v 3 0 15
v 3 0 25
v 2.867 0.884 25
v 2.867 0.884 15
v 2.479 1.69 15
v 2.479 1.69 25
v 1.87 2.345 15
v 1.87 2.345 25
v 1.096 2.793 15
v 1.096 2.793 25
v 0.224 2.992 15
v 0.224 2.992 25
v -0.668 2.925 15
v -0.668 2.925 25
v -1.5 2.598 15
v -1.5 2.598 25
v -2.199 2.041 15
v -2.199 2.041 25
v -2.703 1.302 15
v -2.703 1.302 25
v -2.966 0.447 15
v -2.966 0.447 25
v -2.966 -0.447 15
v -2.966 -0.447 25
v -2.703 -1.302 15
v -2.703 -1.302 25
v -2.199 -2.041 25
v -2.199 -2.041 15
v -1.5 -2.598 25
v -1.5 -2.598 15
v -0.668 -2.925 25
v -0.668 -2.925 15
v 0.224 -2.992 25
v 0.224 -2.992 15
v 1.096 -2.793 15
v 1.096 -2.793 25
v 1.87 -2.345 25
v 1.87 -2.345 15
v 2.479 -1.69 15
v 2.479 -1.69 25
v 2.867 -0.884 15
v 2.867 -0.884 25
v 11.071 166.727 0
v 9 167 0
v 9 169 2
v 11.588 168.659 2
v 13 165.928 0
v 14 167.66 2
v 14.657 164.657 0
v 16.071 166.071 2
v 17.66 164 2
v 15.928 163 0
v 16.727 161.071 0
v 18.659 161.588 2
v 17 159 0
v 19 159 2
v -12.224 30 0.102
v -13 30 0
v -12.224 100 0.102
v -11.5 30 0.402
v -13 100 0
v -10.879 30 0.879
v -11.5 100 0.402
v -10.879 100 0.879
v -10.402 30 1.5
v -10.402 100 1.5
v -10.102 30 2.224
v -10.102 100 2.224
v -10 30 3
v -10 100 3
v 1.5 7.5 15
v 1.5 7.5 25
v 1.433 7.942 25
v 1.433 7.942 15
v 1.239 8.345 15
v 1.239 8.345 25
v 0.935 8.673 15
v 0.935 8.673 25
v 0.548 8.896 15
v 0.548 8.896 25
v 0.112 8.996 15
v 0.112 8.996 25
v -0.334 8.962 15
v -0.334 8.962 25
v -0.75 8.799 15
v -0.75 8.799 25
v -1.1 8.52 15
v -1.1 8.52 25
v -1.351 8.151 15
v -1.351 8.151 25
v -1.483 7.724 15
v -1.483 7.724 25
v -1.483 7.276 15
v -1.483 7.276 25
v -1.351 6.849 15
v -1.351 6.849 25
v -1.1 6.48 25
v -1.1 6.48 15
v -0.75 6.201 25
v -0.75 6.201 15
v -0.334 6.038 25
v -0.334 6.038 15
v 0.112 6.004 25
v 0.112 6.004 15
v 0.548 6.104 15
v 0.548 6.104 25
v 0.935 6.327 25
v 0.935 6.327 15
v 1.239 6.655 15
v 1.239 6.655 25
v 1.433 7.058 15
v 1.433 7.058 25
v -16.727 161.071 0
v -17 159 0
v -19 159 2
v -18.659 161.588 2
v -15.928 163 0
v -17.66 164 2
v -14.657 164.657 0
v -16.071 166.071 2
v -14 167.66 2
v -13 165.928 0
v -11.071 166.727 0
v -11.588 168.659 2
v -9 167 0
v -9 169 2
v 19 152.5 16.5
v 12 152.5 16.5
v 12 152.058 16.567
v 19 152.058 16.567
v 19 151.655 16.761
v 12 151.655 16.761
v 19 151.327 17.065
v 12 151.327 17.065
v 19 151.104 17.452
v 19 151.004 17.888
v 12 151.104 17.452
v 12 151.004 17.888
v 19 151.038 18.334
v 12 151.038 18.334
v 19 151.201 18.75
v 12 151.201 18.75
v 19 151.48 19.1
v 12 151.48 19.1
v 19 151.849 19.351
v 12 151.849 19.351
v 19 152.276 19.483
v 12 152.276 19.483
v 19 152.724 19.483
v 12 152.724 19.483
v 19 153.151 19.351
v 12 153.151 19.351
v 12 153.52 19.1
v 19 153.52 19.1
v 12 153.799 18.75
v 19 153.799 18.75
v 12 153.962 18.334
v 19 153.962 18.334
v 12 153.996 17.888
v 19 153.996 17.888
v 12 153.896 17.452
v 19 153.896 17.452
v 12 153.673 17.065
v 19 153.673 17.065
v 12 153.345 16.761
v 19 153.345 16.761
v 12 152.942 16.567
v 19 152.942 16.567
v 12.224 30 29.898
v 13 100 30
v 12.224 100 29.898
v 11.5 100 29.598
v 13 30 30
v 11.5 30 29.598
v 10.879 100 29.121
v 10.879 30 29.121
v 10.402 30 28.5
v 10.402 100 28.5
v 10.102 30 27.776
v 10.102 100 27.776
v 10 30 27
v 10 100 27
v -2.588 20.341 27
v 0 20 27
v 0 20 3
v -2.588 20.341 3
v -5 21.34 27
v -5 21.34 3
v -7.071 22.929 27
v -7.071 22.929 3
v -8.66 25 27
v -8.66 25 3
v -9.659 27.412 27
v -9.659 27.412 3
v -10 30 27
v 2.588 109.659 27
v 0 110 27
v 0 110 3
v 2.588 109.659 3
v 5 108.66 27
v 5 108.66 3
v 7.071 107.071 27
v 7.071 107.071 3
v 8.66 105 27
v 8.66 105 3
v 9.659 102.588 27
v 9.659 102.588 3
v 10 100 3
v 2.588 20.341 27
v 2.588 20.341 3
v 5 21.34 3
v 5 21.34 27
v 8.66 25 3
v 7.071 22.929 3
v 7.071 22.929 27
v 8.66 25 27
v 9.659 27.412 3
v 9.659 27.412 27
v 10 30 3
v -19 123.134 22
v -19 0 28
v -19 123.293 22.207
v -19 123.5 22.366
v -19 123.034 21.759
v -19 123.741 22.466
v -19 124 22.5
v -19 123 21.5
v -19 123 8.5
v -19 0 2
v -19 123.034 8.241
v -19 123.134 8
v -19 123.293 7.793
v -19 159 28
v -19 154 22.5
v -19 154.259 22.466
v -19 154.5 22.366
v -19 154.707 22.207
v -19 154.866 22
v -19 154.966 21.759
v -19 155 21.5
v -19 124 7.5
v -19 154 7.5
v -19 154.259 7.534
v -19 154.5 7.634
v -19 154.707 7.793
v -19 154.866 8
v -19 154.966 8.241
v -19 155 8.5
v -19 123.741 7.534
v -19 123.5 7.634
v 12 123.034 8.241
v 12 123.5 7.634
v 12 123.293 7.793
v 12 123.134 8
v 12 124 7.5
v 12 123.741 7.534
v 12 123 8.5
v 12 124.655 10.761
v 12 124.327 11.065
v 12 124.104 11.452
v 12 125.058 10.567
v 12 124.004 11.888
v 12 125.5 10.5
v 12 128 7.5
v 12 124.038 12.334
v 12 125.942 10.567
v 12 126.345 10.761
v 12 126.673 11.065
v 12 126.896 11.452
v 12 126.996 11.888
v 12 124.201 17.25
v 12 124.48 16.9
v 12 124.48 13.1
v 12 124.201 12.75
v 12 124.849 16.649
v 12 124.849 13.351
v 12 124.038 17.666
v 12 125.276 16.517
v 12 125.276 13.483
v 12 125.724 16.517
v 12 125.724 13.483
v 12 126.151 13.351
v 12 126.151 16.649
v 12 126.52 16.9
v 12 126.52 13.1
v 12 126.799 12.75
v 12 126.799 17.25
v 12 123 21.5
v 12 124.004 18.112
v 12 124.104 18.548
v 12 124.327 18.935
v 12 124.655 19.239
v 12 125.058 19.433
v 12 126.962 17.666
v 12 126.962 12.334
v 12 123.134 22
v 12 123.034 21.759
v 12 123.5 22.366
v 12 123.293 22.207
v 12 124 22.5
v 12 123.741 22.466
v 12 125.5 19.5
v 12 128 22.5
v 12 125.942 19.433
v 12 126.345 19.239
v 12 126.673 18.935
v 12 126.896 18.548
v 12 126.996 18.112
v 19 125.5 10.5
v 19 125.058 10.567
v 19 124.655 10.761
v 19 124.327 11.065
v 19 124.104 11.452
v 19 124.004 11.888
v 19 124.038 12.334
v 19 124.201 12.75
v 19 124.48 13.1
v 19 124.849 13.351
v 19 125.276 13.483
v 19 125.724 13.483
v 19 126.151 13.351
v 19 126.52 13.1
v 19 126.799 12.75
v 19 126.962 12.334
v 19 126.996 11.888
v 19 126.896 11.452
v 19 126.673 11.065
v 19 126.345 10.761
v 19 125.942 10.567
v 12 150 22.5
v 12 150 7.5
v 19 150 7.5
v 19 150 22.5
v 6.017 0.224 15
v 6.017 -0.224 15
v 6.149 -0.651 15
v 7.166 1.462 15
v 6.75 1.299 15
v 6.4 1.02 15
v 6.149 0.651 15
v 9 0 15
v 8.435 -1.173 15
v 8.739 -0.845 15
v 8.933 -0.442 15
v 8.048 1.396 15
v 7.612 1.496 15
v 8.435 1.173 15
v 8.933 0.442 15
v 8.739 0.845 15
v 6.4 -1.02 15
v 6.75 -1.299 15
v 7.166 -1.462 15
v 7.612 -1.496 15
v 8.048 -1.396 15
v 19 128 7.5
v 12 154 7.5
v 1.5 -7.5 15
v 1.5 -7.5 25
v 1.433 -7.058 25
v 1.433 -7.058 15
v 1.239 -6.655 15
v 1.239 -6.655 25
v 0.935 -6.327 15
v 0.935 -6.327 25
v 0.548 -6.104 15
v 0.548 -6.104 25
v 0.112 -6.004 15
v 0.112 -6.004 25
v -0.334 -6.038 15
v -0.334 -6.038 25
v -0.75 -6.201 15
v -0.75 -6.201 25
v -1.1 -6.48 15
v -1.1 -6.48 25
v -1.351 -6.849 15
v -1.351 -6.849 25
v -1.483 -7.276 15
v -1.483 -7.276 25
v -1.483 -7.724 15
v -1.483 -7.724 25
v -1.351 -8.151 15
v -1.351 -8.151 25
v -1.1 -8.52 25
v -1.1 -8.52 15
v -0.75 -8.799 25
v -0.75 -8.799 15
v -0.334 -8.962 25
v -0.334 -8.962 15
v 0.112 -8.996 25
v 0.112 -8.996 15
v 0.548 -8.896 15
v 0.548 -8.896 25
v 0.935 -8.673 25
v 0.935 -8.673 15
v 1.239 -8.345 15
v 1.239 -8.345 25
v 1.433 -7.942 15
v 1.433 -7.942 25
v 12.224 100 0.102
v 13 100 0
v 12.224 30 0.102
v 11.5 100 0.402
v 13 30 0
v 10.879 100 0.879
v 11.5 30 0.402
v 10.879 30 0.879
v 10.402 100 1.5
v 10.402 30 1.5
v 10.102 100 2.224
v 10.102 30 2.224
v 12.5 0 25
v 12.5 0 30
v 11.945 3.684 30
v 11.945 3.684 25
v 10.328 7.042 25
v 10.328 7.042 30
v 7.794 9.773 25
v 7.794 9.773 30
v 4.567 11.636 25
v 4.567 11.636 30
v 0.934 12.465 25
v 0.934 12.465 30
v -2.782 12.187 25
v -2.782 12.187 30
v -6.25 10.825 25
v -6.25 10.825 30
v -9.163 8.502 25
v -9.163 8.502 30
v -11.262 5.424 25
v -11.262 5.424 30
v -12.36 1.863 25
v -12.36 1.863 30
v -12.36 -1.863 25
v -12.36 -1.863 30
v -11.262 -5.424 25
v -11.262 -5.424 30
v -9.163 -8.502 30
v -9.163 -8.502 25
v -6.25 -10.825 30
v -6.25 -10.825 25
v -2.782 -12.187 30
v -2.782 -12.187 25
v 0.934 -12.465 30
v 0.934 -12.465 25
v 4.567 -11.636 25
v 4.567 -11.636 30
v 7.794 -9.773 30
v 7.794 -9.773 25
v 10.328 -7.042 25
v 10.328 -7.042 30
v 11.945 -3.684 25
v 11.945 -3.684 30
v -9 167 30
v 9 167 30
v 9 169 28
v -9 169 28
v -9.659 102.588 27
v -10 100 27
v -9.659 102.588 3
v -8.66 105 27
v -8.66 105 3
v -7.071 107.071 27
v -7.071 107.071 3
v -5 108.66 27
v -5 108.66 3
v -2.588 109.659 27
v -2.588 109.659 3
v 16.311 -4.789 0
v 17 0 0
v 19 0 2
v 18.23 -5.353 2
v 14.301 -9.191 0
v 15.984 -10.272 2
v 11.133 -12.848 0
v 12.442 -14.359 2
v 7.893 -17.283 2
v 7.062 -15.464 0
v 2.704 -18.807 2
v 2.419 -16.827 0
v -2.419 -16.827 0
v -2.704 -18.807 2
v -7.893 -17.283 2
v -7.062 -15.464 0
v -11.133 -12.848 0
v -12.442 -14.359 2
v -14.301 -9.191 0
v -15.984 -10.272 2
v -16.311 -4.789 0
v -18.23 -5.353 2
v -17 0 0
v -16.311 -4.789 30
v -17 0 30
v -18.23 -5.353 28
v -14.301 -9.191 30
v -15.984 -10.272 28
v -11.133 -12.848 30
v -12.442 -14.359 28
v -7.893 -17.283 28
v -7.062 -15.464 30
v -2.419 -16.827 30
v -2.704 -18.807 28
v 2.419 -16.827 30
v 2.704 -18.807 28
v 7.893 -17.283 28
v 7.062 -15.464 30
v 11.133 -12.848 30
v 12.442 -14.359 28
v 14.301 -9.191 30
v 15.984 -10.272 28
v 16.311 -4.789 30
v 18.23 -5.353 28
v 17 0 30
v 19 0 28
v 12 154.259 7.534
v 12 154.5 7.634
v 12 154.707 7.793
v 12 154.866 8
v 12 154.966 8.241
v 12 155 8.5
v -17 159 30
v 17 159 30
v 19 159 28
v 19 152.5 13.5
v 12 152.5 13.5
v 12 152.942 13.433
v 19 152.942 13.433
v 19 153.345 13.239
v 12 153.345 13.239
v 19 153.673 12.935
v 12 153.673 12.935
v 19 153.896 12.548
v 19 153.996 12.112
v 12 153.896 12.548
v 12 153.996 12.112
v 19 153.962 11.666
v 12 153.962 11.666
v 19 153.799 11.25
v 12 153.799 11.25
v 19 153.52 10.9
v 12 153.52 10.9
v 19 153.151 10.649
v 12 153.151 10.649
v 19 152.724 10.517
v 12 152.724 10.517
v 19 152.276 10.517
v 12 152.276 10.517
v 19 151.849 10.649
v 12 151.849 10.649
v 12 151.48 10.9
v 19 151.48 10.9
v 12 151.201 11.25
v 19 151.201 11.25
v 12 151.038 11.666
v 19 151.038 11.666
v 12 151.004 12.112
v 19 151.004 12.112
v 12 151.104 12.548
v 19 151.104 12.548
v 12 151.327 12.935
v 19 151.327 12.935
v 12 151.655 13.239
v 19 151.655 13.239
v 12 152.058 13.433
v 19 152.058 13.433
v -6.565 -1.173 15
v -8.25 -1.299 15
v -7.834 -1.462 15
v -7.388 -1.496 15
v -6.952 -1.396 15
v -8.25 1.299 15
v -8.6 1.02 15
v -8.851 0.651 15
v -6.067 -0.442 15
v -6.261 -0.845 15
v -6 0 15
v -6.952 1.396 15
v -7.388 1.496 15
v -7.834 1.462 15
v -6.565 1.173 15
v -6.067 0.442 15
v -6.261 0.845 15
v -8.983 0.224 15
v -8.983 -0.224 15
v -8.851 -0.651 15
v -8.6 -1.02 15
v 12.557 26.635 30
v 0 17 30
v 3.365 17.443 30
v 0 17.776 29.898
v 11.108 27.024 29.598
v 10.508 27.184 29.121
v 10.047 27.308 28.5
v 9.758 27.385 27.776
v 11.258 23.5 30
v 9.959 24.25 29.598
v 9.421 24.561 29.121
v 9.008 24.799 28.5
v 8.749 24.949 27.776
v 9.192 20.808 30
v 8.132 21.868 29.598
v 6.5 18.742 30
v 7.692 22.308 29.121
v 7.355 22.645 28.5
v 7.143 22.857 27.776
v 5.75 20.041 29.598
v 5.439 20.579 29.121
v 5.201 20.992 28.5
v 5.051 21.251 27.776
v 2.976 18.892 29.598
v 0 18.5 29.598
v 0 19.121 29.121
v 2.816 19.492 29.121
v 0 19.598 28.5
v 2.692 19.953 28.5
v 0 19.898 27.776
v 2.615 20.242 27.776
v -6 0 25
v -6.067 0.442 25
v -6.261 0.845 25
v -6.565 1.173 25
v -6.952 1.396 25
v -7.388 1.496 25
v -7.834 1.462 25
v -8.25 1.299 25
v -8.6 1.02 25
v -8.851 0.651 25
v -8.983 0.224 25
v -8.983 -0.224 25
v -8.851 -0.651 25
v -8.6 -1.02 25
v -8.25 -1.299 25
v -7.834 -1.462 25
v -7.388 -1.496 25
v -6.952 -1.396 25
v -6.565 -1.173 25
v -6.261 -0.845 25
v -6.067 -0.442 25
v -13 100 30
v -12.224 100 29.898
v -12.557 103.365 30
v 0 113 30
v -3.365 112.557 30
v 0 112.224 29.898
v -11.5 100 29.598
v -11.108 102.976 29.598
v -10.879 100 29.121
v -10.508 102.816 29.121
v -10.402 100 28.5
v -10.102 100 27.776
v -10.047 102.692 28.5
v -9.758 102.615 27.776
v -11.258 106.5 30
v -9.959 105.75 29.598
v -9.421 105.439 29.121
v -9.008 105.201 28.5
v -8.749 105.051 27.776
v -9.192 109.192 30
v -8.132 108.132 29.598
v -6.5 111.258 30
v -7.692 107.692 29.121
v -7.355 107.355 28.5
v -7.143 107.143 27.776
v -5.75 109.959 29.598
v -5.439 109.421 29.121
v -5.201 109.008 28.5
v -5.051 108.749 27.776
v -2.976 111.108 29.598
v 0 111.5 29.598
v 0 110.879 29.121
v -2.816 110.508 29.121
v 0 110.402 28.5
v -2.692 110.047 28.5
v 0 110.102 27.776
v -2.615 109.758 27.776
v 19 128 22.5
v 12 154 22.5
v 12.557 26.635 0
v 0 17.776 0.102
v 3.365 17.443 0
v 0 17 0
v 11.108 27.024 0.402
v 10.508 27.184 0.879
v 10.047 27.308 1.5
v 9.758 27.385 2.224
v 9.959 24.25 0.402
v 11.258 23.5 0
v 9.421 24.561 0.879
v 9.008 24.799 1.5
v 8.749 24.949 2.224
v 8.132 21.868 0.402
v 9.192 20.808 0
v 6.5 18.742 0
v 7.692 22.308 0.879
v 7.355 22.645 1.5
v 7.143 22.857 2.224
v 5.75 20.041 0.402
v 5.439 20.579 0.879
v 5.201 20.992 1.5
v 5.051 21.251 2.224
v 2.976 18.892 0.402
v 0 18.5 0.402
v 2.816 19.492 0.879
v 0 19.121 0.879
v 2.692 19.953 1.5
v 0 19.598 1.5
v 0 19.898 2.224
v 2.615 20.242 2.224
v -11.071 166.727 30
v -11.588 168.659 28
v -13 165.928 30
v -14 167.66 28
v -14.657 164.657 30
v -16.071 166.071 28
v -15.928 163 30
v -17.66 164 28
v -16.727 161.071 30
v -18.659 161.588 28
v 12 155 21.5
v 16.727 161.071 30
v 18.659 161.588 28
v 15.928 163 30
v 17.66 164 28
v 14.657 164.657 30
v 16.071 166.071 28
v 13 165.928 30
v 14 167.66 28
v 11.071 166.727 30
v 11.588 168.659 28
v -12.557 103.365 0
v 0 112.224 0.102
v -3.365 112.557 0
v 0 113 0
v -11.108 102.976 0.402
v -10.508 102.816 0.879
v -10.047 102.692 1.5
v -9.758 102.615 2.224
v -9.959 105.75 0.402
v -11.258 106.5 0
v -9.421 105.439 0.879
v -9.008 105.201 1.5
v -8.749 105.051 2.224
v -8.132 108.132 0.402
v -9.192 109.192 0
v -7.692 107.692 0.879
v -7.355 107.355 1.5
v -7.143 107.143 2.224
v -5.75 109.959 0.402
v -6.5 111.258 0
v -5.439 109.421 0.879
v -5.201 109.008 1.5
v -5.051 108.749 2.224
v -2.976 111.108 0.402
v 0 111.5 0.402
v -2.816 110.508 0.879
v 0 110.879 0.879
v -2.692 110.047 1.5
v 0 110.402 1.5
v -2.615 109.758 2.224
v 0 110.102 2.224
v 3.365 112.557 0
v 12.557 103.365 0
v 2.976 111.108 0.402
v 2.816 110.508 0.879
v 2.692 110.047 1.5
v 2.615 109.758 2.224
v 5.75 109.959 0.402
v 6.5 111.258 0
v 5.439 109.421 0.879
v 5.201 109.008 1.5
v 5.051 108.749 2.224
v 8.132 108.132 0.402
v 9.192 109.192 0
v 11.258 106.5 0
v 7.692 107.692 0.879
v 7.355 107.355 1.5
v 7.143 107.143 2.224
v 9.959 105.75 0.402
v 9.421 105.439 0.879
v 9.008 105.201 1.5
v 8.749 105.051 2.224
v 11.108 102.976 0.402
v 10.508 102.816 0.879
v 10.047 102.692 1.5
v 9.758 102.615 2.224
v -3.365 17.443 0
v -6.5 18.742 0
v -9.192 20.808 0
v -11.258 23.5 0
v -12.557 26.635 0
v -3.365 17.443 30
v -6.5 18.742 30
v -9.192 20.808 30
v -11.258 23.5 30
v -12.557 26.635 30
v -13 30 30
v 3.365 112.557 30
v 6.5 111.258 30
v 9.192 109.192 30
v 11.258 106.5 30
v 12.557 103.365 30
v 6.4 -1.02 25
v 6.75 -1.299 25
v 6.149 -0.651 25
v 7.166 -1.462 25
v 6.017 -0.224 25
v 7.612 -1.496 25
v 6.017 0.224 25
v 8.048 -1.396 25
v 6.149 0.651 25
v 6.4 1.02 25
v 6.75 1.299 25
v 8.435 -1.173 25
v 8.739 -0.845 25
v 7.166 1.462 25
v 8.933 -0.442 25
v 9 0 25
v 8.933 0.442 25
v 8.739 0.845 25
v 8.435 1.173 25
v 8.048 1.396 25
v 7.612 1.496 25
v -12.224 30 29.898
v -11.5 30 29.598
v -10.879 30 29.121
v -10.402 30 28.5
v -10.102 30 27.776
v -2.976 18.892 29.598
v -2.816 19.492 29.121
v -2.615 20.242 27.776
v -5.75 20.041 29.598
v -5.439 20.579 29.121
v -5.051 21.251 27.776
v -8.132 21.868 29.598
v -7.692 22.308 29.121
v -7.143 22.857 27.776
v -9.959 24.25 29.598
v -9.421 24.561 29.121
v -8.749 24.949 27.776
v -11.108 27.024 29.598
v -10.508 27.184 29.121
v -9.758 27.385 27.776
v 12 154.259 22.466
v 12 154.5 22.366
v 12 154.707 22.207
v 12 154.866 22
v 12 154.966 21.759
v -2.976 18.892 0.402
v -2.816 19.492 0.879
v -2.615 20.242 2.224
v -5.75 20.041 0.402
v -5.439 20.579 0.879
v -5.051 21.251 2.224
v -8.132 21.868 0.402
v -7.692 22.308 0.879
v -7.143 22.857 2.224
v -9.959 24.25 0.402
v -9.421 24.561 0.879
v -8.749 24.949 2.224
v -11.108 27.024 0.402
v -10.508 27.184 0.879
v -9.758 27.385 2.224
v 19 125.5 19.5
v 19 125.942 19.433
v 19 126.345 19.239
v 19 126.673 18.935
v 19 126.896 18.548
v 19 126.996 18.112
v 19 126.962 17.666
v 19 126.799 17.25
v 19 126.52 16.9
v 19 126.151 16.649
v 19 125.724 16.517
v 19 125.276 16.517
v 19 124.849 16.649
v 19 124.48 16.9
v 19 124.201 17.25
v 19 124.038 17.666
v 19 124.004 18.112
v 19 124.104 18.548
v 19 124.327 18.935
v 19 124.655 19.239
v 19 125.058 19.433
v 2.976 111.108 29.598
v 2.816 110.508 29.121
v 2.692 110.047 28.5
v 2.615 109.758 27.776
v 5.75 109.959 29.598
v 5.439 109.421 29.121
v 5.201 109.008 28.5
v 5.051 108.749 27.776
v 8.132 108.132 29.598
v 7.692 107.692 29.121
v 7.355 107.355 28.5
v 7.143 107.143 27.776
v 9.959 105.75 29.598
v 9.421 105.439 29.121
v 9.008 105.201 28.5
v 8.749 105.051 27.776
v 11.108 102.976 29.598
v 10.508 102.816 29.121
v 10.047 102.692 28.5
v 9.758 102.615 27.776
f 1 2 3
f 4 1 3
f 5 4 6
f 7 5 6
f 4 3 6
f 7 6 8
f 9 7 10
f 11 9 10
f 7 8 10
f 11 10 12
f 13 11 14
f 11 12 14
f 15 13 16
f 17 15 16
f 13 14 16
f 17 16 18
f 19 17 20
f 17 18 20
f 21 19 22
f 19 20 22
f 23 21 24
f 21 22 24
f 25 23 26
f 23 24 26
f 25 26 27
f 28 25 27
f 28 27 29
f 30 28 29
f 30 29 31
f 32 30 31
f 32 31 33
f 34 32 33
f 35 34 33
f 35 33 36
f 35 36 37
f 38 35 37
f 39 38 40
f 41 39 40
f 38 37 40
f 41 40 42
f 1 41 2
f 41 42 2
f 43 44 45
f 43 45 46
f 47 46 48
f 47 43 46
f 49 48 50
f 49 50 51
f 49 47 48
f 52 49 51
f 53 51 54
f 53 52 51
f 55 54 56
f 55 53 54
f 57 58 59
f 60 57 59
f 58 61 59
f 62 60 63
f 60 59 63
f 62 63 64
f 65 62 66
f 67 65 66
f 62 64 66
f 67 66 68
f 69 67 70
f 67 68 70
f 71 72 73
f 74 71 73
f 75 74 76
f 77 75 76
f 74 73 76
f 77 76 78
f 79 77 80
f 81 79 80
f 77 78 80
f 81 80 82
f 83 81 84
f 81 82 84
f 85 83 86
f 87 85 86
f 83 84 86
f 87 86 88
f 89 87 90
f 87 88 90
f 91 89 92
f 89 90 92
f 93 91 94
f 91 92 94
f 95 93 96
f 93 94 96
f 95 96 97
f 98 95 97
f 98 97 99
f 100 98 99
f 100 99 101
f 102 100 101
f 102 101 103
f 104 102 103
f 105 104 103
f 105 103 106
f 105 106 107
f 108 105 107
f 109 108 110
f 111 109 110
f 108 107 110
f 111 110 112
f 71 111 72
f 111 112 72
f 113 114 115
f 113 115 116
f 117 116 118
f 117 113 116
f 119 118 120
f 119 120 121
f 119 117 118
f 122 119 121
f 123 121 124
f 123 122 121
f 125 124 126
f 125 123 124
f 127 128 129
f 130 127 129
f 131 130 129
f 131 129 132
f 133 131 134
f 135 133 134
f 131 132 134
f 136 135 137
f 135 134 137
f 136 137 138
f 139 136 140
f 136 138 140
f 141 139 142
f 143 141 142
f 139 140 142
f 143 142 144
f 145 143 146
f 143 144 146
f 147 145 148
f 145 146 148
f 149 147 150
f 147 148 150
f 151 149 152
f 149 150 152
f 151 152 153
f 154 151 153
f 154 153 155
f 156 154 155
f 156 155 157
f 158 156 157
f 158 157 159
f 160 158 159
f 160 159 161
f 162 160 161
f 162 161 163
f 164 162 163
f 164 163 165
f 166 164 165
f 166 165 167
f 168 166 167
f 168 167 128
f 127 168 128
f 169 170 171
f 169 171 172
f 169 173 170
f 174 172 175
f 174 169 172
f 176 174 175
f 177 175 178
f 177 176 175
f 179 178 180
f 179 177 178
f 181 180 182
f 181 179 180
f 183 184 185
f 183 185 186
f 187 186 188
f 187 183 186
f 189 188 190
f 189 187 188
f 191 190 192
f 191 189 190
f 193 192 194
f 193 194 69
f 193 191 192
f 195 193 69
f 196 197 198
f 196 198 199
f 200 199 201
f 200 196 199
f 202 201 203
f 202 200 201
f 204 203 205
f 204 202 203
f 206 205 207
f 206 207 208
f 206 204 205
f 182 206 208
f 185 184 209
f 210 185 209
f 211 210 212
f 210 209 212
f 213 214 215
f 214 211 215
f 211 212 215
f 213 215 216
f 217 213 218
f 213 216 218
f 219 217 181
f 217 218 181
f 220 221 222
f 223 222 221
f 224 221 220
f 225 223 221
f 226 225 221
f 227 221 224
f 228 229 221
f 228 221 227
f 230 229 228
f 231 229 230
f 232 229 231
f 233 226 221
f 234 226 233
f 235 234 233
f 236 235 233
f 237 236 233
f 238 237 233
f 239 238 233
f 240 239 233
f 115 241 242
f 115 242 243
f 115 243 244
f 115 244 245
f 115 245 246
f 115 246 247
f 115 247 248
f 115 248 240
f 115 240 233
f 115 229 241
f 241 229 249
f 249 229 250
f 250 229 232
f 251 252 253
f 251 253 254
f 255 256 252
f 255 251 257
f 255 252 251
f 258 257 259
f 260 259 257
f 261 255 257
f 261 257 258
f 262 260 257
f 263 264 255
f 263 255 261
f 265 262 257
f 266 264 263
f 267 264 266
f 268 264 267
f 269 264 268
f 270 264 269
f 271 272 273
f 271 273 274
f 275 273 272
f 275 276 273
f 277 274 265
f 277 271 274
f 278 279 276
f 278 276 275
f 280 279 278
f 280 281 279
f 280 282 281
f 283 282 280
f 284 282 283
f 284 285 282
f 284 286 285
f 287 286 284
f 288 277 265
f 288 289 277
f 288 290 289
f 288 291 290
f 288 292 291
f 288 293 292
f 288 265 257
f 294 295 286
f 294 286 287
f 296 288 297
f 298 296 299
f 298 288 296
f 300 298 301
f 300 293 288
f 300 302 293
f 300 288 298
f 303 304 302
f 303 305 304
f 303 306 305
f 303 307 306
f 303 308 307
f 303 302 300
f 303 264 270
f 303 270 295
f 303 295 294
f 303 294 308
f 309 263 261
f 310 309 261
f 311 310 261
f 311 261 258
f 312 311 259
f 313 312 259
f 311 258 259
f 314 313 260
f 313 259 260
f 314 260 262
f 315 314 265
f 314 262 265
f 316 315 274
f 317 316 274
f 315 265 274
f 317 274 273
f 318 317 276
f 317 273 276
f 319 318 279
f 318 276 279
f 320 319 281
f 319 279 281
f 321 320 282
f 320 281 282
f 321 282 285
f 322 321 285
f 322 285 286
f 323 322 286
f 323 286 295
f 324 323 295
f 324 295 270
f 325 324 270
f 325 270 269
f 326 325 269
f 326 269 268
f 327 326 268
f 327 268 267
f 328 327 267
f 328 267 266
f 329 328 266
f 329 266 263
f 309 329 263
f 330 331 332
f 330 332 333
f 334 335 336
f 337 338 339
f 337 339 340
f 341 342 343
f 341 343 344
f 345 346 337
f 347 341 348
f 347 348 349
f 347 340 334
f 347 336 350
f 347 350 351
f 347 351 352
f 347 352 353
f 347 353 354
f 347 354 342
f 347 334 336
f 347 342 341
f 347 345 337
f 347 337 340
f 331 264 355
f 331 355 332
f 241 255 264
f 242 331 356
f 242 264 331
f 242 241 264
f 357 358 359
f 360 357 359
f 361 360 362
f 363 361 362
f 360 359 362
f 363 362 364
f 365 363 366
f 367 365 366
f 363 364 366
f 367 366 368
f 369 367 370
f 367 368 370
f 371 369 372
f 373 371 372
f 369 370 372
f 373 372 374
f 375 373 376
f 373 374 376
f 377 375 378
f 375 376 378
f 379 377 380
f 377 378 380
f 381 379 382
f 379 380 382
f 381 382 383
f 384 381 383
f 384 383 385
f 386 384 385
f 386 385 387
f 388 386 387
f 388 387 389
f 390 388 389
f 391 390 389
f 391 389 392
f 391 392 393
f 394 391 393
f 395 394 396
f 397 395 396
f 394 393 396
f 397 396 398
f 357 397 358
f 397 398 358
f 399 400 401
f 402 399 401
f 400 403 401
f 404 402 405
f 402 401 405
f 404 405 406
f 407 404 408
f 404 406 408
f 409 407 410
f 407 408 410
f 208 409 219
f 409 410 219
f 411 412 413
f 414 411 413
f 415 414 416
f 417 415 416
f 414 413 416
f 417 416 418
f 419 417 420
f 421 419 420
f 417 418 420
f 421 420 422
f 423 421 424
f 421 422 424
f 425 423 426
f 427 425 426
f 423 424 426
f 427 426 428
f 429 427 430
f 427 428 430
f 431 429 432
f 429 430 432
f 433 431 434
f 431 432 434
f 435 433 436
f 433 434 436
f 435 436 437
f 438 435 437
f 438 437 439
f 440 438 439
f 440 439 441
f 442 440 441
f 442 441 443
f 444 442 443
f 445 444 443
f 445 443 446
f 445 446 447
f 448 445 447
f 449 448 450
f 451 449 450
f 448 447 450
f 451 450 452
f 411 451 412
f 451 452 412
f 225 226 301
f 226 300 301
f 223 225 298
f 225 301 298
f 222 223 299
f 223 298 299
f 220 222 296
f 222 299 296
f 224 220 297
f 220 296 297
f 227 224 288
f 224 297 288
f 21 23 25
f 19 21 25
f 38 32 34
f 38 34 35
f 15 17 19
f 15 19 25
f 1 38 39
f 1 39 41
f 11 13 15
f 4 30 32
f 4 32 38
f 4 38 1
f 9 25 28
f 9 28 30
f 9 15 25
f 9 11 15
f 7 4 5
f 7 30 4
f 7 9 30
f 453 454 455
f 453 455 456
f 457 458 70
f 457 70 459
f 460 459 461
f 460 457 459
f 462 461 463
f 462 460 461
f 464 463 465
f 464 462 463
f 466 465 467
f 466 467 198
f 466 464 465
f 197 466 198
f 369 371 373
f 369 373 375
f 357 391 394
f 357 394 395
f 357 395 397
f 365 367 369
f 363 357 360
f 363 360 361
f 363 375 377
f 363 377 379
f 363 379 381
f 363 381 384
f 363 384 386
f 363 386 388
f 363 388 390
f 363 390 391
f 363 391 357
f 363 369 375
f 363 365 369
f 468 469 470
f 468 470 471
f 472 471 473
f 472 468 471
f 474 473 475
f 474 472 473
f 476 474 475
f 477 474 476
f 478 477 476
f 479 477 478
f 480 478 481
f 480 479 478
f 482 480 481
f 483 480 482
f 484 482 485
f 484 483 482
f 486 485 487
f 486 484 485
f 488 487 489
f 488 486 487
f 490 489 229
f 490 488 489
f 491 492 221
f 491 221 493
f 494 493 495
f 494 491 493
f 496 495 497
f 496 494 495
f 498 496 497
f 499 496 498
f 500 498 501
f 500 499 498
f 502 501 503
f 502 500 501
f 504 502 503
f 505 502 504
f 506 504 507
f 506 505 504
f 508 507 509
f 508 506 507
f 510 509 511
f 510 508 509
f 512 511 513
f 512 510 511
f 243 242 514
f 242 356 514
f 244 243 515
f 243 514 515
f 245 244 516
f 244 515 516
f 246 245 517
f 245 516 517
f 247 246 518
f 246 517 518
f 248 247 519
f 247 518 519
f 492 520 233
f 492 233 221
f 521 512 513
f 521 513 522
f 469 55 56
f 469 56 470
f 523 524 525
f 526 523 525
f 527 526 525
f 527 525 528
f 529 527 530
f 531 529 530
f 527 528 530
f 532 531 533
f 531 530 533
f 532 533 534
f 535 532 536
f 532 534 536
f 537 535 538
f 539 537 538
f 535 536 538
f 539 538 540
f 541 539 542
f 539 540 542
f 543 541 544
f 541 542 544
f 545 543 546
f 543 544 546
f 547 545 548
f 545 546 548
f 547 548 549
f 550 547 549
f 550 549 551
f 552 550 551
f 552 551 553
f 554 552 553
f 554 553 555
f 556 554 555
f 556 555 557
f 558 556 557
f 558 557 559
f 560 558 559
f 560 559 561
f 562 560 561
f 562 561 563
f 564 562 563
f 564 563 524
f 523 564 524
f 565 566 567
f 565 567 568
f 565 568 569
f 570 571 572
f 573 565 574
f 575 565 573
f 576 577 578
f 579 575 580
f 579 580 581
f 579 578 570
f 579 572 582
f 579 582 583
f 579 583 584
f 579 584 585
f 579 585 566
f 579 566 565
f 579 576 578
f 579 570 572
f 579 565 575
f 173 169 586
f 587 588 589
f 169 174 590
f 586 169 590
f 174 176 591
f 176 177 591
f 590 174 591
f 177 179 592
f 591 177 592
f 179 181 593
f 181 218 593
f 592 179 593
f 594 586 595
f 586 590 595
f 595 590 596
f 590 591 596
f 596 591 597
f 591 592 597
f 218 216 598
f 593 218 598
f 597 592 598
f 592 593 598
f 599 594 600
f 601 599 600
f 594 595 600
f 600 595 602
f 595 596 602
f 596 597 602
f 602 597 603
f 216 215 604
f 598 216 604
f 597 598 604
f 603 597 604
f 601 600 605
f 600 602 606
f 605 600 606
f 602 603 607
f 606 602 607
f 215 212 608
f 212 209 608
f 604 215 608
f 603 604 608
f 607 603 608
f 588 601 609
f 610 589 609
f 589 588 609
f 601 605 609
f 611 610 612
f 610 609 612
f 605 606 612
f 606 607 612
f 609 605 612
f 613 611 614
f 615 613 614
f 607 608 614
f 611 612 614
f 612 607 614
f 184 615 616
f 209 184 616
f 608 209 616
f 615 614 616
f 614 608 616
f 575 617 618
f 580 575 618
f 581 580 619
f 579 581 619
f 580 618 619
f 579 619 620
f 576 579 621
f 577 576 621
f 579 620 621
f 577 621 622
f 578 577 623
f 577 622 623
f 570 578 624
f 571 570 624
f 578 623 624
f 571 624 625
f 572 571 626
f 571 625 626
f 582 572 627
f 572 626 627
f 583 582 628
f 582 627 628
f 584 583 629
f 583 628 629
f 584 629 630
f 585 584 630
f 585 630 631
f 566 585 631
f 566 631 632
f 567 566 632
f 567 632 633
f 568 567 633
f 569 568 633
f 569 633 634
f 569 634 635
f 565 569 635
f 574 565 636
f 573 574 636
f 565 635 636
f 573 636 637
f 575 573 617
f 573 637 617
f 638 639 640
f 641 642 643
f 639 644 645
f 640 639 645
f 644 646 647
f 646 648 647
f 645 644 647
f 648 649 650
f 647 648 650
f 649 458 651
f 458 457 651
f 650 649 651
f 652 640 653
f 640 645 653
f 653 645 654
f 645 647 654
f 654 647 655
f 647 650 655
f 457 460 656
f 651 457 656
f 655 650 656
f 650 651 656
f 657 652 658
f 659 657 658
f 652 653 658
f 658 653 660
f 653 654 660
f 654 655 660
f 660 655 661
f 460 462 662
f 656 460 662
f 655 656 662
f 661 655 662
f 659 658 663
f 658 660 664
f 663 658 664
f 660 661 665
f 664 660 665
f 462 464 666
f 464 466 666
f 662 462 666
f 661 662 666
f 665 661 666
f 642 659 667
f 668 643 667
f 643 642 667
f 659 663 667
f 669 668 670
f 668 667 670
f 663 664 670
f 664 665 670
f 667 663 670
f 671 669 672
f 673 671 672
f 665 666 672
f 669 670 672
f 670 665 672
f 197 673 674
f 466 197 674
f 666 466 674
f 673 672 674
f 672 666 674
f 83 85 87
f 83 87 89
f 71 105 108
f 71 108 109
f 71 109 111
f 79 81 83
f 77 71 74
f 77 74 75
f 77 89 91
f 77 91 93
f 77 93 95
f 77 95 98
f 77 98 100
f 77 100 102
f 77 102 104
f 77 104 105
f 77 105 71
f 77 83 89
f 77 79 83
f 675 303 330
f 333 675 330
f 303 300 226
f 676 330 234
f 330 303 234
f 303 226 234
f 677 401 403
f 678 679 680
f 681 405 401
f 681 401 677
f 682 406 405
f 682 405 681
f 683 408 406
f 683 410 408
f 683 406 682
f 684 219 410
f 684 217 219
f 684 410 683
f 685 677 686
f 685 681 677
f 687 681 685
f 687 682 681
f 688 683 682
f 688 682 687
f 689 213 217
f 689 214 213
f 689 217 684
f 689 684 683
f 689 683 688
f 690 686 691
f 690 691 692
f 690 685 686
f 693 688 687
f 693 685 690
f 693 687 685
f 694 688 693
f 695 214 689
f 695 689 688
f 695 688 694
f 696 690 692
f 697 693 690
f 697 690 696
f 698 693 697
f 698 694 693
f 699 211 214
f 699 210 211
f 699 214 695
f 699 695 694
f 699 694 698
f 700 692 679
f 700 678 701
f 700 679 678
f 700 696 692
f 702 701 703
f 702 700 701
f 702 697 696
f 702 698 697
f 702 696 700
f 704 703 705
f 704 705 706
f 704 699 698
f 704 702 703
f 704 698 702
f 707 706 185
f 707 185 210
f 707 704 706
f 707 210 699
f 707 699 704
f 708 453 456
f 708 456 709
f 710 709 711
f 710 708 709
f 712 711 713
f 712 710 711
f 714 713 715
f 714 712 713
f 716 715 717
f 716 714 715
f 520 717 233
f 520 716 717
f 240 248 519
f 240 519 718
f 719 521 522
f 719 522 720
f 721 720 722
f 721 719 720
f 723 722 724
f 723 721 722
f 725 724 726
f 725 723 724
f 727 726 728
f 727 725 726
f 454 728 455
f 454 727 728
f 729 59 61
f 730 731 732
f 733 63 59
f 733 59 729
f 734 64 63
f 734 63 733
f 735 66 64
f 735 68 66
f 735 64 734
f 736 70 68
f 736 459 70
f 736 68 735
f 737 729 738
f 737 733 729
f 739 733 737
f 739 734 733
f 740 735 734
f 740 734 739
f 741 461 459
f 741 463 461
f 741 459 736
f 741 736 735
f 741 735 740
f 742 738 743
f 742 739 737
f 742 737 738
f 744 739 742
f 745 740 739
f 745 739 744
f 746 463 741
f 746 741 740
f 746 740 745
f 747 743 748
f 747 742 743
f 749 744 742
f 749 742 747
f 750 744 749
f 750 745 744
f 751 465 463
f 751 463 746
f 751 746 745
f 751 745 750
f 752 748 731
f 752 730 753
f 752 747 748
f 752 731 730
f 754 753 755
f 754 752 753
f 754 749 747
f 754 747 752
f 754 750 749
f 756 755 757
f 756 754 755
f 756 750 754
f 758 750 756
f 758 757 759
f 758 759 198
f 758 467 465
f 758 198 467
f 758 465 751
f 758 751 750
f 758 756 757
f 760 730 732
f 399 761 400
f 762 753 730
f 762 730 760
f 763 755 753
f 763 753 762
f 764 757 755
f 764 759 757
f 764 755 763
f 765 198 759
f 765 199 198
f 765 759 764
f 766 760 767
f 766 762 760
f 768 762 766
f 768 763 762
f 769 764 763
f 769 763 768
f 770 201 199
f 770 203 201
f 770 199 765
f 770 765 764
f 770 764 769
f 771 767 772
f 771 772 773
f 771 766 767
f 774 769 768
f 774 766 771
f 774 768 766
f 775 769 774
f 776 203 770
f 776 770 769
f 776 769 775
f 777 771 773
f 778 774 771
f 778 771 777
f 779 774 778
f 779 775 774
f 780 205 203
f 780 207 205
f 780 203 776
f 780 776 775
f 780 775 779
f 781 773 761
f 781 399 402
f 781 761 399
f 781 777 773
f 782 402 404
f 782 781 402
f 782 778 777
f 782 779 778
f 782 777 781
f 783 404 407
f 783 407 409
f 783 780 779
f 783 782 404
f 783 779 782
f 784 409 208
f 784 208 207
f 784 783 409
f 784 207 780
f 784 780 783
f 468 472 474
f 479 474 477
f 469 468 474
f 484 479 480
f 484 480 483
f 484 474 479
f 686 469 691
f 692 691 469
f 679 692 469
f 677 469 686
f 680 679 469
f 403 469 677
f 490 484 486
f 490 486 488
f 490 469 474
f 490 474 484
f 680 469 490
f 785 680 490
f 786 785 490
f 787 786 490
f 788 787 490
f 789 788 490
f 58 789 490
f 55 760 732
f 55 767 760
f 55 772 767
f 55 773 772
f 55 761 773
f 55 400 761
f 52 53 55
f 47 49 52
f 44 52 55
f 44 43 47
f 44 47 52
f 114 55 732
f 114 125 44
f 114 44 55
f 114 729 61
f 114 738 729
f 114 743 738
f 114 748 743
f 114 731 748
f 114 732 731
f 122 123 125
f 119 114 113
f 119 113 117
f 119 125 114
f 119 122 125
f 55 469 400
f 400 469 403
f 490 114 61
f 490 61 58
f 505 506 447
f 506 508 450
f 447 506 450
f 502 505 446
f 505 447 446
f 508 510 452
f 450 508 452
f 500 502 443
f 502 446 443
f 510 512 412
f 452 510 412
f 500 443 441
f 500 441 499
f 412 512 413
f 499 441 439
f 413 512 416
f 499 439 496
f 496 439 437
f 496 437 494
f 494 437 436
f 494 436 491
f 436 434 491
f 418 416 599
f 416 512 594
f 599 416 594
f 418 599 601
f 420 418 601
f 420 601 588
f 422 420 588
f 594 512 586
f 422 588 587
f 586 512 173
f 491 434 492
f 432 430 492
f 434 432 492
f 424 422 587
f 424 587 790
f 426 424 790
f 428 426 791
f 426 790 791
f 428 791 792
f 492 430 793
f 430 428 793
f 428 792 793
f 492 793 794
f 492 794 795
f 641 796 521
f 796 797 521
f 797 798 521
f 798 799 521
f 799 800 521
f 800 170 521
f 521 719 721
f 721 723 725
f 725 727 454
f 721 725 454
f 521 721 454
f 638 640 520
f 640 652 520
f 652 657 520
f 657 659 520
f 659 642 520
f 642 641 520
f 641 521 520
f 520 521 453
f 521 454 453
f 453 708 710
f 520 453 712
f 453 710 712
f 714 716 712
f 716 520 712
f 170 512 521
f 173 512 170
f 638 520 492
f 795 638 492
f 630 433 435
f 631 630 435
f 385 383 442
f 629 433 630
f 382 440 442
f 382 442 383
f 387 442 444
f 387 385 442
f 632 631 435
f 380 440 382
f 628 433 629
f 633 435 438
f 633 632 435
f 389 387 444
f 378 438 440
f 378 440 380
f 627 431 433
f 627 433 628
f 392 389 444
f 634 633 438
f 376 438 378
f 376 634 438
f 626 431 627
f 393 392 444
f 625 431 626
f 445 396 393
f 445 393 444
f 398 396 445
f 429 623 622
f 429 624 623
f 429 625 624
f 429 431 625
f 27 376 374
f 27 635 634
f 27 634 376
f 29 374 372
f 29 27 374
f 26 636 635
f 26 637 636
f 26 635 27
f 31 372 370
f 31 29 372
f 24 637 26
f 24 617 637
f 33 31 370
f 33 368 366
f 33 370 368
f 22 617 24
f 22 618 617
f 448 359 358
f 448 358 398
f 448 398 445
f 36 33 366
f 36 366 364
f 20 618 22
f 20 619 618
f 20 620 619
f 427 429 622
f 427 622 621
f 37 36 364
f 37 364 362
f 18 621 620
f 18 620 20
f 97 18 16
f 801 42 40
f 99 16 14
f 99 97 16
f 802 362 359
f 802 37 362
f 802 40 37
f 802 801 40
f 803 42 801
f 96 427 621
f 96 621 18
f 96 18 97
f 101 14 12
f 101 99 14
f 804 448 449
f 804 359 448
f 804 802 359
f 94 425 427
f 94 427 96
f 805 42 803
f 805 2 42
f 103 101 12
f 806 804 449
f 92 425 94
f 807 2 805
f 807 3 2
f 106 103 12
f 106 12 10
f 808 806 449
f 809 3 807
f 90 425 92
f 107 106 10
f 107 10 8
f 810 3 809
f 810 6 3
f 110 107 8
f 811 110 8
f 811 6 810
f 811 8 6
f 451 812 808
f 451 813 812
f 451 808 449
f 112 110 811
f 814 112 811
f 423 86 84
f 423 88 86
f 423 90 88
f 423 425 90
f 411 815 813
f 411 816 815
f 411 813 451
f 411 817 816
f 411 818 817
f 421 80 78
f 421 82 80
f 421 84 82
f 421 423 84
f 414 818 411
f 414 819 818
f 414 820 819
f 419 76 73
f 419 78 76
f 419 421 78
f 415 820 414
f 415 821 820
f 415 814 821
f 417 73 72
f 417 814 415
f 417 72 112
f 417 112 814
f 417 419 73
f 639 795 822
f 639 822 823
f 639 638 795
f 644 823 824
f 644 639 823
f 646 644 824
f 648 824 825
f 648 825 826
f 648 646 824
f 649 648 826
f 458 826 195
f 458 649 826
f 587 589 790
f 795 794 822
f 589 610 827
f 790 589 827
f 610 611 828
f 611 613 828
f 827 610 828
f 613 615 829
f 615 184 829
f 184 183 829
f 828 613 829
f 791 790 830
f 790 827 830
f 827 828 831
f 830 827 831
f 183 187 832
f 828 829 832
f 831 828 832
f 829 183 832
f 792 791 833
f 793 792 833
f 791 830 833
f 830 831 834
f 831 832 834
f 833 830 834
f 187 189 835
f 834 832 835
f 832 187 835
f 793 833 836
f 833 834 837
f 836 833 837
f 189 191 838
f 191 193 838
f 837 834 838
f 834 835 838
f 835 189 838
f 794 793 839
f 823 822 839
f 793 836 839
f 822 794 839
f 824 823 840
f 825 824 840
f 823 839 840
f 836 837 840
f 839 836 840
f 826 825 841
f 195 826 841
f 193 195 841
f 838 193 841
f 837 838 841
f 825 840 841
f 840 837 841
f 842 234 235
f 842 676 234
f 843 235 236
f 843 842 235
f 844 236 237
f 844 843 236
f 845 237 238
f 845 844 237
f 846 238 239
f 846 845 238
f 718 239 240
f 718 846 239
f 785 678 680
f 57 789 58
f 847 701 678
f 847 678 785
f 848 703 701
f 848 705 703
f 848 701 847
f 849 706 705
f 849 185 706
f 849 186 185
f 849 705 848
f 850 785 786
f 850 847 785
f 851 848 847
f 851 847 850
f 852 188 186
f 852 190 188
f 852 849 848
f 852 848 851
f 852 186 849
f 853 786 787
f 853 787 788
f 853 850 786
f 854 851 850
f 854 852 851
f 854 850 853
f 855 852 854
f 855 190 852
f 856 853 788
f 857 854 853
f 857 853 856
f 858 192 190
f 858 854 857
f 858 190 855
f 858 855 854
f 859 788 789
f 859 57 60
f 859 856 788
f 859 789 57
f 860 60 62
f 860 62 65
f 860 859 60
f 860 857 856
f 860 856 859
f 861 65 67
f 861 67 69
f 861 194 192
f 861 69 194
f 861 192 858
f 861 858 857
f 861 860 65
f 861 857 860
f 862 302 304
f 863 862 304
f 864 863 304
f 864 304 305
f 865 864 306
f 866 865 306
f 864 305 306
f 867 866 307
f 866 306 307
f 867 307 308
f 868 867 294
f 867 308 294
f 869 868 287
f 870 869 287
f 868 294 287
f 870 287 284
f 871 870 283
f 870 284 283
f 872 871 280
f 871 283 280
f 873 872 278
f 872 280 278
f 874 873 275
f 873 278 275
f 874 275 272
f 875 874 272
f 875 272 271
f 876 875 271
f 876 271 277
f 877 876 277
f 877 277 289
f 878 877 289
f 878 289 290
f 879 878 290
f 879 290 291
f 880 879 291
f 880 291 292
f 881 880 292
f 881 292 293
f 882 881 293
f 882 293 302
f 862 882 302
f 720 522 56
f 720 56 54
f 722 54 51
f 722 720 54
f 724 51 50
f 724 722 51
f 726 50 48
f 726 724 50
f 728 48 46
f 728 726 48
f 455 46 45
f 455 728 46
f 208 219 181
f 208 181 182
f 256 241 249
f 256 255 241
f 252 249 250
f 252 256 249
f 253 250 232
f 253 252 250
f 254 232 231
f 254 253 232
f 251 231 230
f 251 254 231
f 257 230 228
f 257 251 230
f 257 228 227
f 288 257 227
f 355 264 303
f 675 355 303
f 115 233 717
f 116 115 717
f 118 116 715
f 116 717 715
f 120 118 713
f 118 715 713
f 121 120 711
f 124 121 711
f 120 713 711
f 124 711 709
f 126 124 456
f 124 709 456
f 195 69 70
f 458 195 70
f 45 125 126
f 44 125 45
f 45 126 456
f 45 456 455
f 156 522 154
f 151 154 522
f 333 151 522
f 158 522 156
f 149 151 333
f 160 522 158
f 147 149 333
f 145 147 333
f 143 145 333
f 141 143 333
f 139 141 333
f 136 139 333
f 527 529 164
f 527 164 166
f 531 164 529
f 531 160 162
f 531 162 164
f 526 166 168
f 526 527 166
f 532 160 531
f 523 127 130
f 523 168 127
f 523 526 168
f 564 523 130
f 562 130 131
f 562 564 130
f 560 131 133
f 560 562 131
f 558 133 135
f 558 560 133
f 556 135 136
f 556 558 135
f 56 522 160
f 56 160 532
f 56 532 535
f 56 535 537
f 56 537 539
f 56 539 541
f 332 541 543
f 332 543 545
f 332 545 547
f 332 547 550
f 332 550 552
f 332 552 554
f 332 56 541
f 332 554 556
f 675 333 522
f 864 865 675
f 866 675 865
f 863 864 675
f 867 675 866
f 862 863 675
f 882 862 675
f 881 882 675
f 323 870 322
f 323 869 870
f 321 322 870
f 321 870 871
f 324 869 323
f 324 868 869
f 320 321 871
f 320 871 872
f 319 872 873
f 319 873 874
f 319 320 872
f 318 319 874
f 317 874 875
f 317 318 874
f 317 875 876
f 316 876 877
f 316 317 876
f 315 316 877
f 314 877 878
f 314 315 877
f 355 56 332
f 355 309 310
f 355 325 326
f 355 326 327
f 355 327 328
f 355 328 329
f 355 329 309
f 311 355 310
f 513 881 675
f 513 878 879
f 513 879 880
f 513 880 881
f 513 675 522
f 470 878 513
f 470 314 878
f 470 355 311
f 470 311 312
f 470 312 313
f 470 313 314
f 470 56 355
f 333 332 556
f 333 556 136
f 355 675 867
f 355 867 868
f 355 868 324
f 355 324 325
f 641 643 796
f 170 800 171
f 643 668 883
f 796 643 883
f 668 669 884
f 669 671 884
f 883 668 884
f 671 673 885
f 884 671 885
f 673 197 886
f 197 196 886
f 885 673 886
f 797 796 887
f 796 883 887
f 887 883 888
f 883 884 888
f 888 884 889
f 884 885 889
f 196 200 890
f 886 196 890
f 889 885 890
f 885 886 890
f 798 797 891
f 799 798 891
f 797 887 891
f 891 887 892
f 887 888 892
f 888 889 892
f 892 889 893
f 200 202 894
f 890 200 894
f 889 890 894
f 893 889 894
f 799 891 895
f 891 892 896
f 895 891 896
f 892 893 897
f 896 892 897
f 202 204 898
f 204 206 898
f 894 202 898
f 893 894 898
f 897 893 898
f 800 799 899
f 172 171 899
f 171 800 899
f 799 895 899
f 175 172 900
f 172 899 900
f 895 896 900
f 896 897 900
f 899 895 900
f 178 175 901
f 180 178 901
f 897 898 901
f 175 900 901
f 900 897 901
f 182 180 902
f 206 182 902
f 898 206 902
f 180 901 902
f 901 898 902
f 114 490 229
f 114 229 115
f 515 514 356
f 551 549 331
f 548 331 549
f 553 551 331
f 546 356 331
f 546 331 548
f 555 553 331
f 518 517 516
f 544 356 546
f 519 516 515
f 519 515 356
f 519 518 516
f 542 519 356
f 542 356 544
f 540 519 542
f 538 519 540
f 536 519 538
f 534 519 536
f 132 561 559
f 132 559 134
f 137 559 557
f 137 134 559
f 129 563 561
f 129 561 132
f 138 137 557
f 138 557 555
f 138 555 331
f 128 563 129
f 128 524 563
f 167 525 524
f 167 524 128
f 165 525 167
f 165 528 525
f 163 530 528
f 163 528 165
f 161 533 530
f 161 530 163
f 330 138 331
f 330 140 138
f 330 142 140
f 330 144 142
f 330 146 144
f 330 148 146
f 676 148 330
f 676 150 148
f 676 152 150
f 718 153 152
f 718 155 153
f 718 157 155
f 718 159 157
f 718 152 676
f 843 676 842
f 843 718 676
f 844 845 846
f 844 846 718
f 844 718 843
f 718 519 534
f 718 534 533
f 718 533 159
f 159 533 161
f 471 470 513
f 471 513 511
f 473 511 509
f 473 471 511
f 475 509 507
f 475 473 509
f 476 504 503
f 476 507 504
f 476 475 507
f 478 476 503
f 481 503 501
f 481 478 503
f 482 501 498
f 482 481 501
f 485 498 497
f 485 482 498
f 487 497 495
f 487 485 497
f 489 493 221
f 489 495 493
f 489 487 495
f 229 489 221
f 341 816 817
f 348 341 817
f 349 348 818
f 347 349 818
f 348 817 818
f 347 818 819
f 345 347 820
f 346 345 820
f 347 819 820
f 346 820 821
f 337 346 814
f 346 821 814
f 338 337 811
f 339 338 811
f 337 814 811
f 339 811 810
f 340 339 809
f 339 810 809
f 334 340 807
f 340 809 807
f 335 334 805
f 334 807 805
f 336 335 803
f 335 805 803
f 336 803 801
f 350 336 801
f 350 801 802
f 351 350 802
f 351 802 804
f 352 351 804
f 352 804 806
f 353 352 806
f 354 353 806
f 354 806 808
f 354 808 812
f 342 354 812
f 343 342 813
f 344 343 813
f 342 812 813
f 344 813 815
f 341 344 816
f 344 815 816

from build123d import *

# Parameters (mm, degrees)
BOSS_EXTRUDE1_DEPTH = 30
SKETCH2_R           = 12.5
CUT_EXTRUDE1_DEPTH  = 5
SKETCH3_R           = 3
SKETCH3_R_2         = 1.5
CUT_EXTRUDE3_DEPTH  = 10
SKETCH5_W           = 15
SKETCH5_H           = 32
CUT_EXTRUDE4_DEPTH  = 31
SKETCH6_R           = 1.5
SKETCH6_W           = 15
SKETCH6_H           = 22
CUT_EXTRUDE5_DEPTH  = 175.419035658
FILLET2_R           = 10
CHAMFER2_SIZE       = 2
SKETCH7_W           = 20
SKETCH7_H           = 90
CUT_EXTRUDE6_DEPTH  = 173.690474549
FILLET3_R           = 10
FILLET4_R           = 1
FILLET5_R           = 3


with BuildPart() as part:
    # Sketch1 → Boss-Extrude1 (new body)
    with BuildSketch(Plane.XY):
        with BuildLine():
            Line((19, 150), (19, 0))
            ThreePointArc((19, 0), (0, -19), (-19, 0))
            Line((-19, 0), (-19, 150))
            Line((-19, 150), (-19, 169))
            Line((-19, 169), (19, 169))
            Line((19, 169), (19, 150))
        make_face()
    extrude(amount=BOSS_EXTRUDE1_DEPTH)

    # Sketch2 → Cut-Extrude1 (cut)
    with BuildSketch(Plane.XY.offset(30)):
        Circle(SKETCH2_R)
    extrude(amount=-CUT_EXTRUDE1_DEPTH, mode=Mode.SUBTRACT)

    # Sketch3 → Cut-Extrude3 (cut)
    with BuildSketch(Plane.XY.offset(25)):
        Circle(SKETCH3_R)
        with Locations((0, 7.5)):
            Circle(SKETCH3_R_2)
        with Locations((7.5, 0)):
            Circle(SKETCH3_R_2)
        with Locations((0, -7.5)):
            Circle(SKETCH3_R_2)
        with Locations((-7.5, 0)):
            Circle(SKETCH3_R_2)
    extrude(amount=-CUT_EXTRUDE3_DEPTH, mode=Mode.SUBTRACT)

    # Sketch5 → Cut-Extrude4 (cut)
    with BuildSketch(Plane.ZY.offset(19)):
        with Locations((15, 139)):
            Rectangle(SKETCH5_W, SKETCH5_H)
    extrude(amount=-CUT_EXTRUDE4_DEPTH, mode=Mode.SUBTRACT)

    # Sketch6 → Cut-Extrude5 (cut, through all)
    with BuildSketch(Plane.ZY.offset(-12)):
        with Locations((12, 152.5)):
            Circle(SKETCH6_R)
        with Locations(Location((18, 152.5, 0), (0, 0, 180))):
            Circle(SKETCH6_R)
        with Locations((18, 125.5)):
            Circle(SKETCH6_R)
        with Locations(Location((12, 125.5, 0), (0, 0, 180))):
            Circle(SKETCH6_R)
        with Locations((15, 139)):
            Rectangle(SKETCH6_W, SKETCH6_H)
    extrude(amount=-CUT_EXTRUDE5_DEPTH, mode=Mode.SUBTRACT)

    # Fillet2
    fillet2_edges = [part.edges().sort_by_distance(p)[0] for p in [
        (-19, 169, 15),
        (19, 169, 15),
    ]]
    fillet(fillet2_edges, radius=FILLET2_R)

    # Chamfer2
    chamfer2_edges = [part.edges().sort_by_distance(p)[0] for p in [
        (16.071067812, 166.071067812, 30),
        (0, -19, 30),
        (19, 79.5, 30),
        (19, 79.5, 0),
        (0, -19, 0),
        (0, 169, 0),
        (0, 169, 30),
        (-19, 79.5, 0),
        (-16.071067812, 166.071067812, 0),
        (16.071067812, 166.071067812, 0),
        (-19, 79.5, 30),
        (-16.071067812, 166.071067812, 30),
    ]]
    chamfer(chamfer2_edges, length=CHAMFER2_SIZE)

    # Sketch7 → Cut-Extrude6 (cut, through all)
    with BuildSketch(Plane(origin=(0, 0, 0), x_dir=(-1, 0, 0), z_dir=(0, 0, -1))):
        with Locations((0, 65)):
            Rectangle(SKETCH7_W, SKETCH7_H)
    extrude(amount=-CUT_EXTRUDE6_DEPTH, mode=Mode.SUBTRACT)

    # Fillet3
    fillet3_edges = [part.edges().sort_by_distance(p)[0] for p in [
        (-10, 110, 15),
        (10, 20, 15),
        (-10, 20, 15),
        (10, 110, 15),
    ]]
    fillet(fillet3_edges, radius=FILLET3_R - 0.0001)  # a hair under: the kernel refuses the full size

    # Fillet4
    fillet4_edges = [part.edges().sort_by_distance(p)[0] for p in [
        (-3.5, 155, 22.5),
        (-3.5, 123, 22.5),
        (-3.5, 123, 7.5),
        (-3.5, 155, 7.5),
    ]]
    fillet(fillet4_edges, radius=FILLET4_R)

    # Fillet5
    fillet5_edges = [part.edges().sort_by_distance(p)[0] for p in [
        (-10, 65, 0),
        (-10, 65, 30),
        (10, 65, 0),
        (10, 65, 30),
        (-7.071097101, 107.071097101, 0),
        (-7.071097101, 107.071097101, 30),
        (7.071097101, 22.928902899, 0),
        (7.071097101, 22.928902899, 30),
        (-7.071097101, 22.928902899, 0),
        (-7.071097101, 22.928902899, 30),
        (7.071097101, 107.071097101, 0),
        (7.071097101, 107.071097101, 30),
    ]]
    fillet(fillet5_edges, radius=FILLET5_R)


solid = part.part
